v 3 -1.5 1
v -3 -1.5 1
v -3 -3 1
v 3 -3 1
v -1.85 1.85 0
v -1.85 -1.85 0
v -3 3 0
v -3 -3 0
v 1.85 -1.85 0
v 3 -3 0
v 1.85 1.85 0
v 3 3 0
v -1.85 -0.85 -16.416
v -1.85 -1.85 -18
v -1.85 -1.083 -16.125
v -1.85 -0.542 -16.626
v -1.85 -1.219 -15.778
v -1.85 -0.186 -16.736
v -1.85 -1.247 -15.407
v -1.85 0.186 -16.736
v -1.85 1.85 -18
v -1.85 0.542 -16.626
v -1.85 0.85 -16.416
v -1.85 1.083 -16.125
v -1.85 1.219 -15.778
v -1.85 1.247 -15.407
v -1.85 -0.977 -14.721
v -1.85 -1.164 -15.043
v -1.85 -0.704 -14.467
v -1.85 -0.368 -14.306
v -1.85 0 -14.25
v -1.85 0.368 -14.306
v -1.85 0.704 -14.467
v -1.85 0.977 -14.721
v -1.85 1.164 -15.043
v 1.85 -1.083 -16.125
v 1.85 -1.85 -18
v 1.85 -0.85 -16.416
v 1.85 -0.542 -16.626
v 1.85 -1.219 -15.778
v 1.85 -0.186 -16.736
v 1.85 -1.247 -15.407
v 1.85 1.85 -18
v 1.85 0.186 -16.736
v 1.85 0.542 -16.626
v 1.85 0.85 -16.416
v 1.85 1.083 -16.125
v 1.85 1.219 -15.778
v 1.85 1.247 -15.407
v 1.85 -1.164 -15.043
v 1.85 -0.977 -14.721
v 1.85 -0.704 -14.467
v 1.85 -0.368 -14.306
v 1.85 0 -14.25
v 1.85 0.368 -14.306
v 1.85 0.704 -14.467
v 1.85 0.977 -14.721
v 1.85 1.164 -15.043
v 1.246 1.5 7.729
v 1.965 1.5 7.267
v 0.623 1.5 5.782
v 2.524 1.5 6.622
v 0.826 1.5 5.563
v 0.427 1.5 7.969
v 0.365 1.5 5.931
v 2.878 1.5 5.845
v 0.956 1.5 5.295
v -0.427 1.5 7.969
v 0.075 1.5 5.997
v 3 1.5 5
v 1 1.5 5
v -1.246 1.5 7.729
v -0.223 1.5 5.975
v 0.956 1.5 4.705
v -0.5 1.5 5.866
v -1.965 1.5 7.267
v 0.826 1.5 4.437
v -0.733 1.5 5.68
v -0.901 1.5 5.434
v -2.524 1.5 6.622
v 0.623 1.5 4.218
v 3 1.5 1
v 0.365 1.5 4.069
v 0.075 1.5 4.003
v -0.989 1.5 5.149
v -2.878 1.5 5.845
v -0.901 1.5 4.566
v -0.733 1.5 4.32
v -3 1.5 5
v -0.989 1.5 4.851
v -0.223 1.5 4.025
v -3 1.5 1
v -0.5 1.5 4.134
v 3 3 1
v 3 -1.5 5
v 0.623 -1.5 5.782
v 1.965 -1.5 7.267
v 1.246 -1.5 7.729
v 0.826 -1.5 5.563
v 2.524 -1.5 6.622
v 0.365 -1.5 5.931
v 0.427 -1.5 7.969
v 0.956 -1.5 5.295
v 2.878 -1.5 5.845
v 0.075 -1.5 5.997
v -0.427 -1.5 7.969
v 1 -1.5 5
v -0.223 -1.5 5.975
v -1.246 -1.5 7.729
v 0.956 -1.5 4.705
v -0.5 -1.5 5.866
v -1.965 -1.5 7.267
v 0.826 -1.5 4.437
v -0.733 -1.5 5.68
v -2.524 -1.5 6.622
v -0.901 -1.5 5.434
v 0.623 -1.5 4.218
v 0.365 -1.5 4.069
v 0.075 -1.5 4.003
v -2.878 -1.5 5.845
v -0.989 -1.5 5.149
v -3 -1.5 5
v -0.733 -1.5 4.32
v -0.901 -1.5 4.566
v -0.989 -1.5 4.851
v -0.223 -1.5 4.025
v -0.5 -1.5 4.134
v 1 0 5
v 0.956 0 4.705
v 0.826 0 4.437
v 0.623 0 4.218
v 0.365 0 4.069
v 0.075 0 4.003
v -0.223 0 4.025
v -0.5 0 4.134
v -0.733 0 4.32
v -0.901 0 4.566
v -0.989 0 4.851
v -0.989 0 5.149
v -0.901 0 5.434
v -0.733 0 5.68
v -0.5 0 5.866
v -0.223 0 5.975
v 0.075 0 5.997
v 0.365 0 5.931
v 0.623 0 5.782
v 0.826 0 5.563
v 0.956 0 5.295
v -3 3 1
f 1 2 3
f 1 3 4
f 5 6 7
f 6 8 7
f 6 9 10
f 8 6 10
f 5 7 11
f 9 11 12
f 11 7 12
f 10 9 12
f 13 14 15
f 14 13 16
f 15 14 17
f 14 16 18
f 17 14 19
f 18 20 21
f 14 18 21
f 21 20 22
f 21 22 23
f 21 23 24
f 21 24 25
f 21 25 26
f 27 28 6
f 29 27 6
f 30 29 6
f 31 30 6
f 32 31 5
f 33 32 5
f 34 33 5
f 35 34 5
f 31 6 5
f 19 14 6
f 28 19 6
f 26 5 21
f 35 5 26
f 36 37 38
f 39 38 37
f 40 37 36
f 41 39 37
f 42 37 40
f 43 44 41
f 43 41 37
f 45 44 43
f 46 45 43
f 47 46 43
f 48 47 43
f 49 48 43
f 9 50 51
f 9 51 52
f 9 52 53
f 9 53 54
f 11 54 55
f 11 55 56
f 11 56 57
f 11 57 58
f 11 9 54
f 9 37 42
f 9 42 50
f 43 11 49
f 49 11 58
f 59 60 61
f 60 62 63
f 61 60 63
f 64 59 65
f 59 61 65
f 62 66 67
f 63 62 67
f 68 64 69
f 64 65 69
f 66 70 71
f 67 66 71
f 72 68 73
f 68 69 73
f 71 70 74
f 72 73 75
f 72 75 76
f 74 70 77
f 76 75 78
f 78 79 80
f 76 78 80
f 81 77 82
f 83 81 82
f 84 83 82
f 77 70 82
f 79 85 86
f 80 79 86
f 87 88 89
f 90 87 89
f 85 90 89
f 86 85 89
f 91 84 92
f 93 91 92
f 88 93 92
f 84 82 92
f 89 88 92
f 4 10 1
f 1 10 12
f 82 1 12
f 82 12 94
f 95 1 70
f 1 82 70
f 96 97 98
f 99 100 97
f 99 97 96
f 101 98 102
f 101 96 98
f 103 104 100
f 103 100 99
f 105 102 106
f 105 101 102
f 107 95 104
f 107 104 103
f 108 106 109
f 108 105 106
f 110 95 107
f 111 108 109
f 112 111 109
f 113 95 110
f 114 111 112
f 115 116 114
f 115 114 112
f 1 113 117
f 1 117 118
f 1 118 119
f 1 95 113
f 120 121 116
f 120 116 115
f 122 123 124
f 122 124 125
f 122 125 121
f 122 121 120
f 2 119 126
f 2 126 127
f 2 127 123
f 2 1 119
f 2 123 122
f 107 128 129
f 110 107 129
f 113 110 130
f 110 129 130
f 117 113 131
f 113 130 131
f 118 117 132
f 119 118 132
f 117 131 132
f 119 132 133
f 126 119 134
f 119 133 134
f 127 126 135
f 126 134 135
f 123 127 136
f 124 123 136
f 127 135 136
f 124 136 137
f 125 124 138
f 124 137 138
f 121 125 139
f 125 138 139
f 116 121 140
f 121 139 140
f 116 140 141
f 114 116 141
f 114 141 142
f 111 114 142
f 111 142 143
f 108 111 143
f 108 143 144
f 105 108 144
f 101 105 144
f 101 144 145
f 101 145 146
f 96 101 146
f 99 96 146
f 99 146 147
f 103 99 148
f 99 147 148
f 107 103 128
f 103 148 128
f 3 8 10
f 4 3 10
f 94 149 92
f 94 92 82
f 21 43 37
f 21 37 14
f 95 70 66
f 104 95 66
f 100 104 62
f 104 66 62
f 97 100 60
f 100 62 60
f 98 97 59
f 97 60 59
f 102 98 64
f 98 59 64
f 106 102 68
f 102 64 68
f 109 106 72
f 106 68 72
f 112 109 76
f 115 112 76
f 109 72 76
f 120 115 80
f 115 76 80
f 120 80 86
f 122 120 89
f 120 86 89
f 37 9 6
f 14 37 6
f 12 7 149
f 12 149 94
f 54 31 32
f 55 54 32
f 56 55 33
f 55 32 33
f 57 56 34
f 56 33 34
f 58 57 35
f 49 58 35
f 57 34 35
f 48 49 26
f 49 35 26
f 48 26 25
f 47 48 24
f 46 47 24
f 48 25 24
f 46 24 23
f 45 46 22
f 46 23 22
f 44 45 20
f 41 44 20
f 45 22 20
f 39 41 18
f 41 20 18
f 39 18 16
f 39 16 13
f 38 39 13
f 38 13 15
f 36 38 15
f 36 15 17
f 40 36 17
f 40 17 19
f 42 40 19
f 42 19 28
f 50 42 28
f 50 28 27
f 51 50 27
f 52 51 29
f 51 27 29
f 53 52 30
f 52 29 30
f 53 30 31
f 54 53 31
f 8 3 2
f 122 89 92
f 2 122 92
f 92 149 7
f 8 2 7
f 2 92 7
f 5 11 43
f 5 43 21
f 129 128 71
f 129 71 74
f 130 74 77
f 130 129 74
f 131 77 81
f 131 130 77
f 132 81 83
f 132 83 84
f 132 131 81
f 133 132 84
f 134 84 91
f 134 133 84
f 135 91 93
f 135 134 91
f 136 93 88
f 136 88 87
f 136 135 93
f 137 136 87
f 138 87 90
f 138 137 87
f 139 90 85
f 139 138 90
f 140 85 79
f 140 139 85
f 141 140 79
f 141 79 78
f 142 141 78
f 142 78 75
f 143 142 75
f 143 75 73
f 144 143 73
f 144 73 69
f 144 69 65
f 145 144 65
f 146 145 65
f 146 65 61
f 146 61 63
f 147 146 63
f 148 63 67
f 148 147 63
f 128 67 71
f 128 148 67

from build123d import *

# Parameters (mm, degrees)
SKETCH_1_W           = 6
SKETCH_1_H           = 6
EXTRUDE_1_DEPTH      = 1
SKETCH_2_R           = 1
EXTRUDE_2_DEPTH      = 1.5
EXTRUDE_2_DEPTH_BACK = 1.5
SKETCH_3_W           = 3.7
SKETCH_3_H           = 3.7
EXTRUDE_3_DEPTH      = 18
SKETCH_4_R           = 1.25
CUT_EXTRUDE_1_DEPTH  = 3.7


with BuildPart() as part:
    # 스케치1 → 보스-돌출1 (new body)
    with BuildSketch(Plane.XY):
        Rectangle(SKETCH_1_W, SKETCH_1_H)
    extrude(amount=EXTRUDE_1_DEPTH)

    # 스케치2 → 보스-돌출2 (add, two sides)
    with BuildSketch(Plane(origin=(0, 0, 0), x_dir=(1, 0, 0), z_dir=(0, 1, 0))) as extrude_2_sk:
        with BuildLine():
            Line((-3, -1), (3, -1))
            Line((3, -1), (3, -5))
            ThreePointArc((3, -5), (0, -8), (-3, -5))
            Line((-3, -5), (-3, -1))
        make_face()
        with Locations((0, -5)):
            Circle(SKETCH_2_R, mode=Mode.SUBTRACT)
    extrude(amount=EXTRUDE_2_DEPTH)
    extrude(extrude_2_sk.sketch, amount=-EXTRUDE_2_DEPTH_BACK)

    # 스케치3 → 보스-돌출3 (add)
    with BuildSketch(Plane(origin=(0, 0, 0), x_dir=(-1, 0, 0), z_dir=(0, 0, -1))):
        Rectangle(SKETCH_3_W, SKETCH_3_H)
    extrude(amount=EXTRUDE_3_DEPTH)

    # 스케치4 → 컷-돌출1 (cut)
    with BuildSketch(Plane.ZY.offset(1.85)):
        with Locations((-15.5, 0)):
            Circle(SKETCH_4_R)
    extrude(amount=-CUT_EXTRUDE_1_DEPTH, mode=Mode.SUBTRACT)


solid = part.part
